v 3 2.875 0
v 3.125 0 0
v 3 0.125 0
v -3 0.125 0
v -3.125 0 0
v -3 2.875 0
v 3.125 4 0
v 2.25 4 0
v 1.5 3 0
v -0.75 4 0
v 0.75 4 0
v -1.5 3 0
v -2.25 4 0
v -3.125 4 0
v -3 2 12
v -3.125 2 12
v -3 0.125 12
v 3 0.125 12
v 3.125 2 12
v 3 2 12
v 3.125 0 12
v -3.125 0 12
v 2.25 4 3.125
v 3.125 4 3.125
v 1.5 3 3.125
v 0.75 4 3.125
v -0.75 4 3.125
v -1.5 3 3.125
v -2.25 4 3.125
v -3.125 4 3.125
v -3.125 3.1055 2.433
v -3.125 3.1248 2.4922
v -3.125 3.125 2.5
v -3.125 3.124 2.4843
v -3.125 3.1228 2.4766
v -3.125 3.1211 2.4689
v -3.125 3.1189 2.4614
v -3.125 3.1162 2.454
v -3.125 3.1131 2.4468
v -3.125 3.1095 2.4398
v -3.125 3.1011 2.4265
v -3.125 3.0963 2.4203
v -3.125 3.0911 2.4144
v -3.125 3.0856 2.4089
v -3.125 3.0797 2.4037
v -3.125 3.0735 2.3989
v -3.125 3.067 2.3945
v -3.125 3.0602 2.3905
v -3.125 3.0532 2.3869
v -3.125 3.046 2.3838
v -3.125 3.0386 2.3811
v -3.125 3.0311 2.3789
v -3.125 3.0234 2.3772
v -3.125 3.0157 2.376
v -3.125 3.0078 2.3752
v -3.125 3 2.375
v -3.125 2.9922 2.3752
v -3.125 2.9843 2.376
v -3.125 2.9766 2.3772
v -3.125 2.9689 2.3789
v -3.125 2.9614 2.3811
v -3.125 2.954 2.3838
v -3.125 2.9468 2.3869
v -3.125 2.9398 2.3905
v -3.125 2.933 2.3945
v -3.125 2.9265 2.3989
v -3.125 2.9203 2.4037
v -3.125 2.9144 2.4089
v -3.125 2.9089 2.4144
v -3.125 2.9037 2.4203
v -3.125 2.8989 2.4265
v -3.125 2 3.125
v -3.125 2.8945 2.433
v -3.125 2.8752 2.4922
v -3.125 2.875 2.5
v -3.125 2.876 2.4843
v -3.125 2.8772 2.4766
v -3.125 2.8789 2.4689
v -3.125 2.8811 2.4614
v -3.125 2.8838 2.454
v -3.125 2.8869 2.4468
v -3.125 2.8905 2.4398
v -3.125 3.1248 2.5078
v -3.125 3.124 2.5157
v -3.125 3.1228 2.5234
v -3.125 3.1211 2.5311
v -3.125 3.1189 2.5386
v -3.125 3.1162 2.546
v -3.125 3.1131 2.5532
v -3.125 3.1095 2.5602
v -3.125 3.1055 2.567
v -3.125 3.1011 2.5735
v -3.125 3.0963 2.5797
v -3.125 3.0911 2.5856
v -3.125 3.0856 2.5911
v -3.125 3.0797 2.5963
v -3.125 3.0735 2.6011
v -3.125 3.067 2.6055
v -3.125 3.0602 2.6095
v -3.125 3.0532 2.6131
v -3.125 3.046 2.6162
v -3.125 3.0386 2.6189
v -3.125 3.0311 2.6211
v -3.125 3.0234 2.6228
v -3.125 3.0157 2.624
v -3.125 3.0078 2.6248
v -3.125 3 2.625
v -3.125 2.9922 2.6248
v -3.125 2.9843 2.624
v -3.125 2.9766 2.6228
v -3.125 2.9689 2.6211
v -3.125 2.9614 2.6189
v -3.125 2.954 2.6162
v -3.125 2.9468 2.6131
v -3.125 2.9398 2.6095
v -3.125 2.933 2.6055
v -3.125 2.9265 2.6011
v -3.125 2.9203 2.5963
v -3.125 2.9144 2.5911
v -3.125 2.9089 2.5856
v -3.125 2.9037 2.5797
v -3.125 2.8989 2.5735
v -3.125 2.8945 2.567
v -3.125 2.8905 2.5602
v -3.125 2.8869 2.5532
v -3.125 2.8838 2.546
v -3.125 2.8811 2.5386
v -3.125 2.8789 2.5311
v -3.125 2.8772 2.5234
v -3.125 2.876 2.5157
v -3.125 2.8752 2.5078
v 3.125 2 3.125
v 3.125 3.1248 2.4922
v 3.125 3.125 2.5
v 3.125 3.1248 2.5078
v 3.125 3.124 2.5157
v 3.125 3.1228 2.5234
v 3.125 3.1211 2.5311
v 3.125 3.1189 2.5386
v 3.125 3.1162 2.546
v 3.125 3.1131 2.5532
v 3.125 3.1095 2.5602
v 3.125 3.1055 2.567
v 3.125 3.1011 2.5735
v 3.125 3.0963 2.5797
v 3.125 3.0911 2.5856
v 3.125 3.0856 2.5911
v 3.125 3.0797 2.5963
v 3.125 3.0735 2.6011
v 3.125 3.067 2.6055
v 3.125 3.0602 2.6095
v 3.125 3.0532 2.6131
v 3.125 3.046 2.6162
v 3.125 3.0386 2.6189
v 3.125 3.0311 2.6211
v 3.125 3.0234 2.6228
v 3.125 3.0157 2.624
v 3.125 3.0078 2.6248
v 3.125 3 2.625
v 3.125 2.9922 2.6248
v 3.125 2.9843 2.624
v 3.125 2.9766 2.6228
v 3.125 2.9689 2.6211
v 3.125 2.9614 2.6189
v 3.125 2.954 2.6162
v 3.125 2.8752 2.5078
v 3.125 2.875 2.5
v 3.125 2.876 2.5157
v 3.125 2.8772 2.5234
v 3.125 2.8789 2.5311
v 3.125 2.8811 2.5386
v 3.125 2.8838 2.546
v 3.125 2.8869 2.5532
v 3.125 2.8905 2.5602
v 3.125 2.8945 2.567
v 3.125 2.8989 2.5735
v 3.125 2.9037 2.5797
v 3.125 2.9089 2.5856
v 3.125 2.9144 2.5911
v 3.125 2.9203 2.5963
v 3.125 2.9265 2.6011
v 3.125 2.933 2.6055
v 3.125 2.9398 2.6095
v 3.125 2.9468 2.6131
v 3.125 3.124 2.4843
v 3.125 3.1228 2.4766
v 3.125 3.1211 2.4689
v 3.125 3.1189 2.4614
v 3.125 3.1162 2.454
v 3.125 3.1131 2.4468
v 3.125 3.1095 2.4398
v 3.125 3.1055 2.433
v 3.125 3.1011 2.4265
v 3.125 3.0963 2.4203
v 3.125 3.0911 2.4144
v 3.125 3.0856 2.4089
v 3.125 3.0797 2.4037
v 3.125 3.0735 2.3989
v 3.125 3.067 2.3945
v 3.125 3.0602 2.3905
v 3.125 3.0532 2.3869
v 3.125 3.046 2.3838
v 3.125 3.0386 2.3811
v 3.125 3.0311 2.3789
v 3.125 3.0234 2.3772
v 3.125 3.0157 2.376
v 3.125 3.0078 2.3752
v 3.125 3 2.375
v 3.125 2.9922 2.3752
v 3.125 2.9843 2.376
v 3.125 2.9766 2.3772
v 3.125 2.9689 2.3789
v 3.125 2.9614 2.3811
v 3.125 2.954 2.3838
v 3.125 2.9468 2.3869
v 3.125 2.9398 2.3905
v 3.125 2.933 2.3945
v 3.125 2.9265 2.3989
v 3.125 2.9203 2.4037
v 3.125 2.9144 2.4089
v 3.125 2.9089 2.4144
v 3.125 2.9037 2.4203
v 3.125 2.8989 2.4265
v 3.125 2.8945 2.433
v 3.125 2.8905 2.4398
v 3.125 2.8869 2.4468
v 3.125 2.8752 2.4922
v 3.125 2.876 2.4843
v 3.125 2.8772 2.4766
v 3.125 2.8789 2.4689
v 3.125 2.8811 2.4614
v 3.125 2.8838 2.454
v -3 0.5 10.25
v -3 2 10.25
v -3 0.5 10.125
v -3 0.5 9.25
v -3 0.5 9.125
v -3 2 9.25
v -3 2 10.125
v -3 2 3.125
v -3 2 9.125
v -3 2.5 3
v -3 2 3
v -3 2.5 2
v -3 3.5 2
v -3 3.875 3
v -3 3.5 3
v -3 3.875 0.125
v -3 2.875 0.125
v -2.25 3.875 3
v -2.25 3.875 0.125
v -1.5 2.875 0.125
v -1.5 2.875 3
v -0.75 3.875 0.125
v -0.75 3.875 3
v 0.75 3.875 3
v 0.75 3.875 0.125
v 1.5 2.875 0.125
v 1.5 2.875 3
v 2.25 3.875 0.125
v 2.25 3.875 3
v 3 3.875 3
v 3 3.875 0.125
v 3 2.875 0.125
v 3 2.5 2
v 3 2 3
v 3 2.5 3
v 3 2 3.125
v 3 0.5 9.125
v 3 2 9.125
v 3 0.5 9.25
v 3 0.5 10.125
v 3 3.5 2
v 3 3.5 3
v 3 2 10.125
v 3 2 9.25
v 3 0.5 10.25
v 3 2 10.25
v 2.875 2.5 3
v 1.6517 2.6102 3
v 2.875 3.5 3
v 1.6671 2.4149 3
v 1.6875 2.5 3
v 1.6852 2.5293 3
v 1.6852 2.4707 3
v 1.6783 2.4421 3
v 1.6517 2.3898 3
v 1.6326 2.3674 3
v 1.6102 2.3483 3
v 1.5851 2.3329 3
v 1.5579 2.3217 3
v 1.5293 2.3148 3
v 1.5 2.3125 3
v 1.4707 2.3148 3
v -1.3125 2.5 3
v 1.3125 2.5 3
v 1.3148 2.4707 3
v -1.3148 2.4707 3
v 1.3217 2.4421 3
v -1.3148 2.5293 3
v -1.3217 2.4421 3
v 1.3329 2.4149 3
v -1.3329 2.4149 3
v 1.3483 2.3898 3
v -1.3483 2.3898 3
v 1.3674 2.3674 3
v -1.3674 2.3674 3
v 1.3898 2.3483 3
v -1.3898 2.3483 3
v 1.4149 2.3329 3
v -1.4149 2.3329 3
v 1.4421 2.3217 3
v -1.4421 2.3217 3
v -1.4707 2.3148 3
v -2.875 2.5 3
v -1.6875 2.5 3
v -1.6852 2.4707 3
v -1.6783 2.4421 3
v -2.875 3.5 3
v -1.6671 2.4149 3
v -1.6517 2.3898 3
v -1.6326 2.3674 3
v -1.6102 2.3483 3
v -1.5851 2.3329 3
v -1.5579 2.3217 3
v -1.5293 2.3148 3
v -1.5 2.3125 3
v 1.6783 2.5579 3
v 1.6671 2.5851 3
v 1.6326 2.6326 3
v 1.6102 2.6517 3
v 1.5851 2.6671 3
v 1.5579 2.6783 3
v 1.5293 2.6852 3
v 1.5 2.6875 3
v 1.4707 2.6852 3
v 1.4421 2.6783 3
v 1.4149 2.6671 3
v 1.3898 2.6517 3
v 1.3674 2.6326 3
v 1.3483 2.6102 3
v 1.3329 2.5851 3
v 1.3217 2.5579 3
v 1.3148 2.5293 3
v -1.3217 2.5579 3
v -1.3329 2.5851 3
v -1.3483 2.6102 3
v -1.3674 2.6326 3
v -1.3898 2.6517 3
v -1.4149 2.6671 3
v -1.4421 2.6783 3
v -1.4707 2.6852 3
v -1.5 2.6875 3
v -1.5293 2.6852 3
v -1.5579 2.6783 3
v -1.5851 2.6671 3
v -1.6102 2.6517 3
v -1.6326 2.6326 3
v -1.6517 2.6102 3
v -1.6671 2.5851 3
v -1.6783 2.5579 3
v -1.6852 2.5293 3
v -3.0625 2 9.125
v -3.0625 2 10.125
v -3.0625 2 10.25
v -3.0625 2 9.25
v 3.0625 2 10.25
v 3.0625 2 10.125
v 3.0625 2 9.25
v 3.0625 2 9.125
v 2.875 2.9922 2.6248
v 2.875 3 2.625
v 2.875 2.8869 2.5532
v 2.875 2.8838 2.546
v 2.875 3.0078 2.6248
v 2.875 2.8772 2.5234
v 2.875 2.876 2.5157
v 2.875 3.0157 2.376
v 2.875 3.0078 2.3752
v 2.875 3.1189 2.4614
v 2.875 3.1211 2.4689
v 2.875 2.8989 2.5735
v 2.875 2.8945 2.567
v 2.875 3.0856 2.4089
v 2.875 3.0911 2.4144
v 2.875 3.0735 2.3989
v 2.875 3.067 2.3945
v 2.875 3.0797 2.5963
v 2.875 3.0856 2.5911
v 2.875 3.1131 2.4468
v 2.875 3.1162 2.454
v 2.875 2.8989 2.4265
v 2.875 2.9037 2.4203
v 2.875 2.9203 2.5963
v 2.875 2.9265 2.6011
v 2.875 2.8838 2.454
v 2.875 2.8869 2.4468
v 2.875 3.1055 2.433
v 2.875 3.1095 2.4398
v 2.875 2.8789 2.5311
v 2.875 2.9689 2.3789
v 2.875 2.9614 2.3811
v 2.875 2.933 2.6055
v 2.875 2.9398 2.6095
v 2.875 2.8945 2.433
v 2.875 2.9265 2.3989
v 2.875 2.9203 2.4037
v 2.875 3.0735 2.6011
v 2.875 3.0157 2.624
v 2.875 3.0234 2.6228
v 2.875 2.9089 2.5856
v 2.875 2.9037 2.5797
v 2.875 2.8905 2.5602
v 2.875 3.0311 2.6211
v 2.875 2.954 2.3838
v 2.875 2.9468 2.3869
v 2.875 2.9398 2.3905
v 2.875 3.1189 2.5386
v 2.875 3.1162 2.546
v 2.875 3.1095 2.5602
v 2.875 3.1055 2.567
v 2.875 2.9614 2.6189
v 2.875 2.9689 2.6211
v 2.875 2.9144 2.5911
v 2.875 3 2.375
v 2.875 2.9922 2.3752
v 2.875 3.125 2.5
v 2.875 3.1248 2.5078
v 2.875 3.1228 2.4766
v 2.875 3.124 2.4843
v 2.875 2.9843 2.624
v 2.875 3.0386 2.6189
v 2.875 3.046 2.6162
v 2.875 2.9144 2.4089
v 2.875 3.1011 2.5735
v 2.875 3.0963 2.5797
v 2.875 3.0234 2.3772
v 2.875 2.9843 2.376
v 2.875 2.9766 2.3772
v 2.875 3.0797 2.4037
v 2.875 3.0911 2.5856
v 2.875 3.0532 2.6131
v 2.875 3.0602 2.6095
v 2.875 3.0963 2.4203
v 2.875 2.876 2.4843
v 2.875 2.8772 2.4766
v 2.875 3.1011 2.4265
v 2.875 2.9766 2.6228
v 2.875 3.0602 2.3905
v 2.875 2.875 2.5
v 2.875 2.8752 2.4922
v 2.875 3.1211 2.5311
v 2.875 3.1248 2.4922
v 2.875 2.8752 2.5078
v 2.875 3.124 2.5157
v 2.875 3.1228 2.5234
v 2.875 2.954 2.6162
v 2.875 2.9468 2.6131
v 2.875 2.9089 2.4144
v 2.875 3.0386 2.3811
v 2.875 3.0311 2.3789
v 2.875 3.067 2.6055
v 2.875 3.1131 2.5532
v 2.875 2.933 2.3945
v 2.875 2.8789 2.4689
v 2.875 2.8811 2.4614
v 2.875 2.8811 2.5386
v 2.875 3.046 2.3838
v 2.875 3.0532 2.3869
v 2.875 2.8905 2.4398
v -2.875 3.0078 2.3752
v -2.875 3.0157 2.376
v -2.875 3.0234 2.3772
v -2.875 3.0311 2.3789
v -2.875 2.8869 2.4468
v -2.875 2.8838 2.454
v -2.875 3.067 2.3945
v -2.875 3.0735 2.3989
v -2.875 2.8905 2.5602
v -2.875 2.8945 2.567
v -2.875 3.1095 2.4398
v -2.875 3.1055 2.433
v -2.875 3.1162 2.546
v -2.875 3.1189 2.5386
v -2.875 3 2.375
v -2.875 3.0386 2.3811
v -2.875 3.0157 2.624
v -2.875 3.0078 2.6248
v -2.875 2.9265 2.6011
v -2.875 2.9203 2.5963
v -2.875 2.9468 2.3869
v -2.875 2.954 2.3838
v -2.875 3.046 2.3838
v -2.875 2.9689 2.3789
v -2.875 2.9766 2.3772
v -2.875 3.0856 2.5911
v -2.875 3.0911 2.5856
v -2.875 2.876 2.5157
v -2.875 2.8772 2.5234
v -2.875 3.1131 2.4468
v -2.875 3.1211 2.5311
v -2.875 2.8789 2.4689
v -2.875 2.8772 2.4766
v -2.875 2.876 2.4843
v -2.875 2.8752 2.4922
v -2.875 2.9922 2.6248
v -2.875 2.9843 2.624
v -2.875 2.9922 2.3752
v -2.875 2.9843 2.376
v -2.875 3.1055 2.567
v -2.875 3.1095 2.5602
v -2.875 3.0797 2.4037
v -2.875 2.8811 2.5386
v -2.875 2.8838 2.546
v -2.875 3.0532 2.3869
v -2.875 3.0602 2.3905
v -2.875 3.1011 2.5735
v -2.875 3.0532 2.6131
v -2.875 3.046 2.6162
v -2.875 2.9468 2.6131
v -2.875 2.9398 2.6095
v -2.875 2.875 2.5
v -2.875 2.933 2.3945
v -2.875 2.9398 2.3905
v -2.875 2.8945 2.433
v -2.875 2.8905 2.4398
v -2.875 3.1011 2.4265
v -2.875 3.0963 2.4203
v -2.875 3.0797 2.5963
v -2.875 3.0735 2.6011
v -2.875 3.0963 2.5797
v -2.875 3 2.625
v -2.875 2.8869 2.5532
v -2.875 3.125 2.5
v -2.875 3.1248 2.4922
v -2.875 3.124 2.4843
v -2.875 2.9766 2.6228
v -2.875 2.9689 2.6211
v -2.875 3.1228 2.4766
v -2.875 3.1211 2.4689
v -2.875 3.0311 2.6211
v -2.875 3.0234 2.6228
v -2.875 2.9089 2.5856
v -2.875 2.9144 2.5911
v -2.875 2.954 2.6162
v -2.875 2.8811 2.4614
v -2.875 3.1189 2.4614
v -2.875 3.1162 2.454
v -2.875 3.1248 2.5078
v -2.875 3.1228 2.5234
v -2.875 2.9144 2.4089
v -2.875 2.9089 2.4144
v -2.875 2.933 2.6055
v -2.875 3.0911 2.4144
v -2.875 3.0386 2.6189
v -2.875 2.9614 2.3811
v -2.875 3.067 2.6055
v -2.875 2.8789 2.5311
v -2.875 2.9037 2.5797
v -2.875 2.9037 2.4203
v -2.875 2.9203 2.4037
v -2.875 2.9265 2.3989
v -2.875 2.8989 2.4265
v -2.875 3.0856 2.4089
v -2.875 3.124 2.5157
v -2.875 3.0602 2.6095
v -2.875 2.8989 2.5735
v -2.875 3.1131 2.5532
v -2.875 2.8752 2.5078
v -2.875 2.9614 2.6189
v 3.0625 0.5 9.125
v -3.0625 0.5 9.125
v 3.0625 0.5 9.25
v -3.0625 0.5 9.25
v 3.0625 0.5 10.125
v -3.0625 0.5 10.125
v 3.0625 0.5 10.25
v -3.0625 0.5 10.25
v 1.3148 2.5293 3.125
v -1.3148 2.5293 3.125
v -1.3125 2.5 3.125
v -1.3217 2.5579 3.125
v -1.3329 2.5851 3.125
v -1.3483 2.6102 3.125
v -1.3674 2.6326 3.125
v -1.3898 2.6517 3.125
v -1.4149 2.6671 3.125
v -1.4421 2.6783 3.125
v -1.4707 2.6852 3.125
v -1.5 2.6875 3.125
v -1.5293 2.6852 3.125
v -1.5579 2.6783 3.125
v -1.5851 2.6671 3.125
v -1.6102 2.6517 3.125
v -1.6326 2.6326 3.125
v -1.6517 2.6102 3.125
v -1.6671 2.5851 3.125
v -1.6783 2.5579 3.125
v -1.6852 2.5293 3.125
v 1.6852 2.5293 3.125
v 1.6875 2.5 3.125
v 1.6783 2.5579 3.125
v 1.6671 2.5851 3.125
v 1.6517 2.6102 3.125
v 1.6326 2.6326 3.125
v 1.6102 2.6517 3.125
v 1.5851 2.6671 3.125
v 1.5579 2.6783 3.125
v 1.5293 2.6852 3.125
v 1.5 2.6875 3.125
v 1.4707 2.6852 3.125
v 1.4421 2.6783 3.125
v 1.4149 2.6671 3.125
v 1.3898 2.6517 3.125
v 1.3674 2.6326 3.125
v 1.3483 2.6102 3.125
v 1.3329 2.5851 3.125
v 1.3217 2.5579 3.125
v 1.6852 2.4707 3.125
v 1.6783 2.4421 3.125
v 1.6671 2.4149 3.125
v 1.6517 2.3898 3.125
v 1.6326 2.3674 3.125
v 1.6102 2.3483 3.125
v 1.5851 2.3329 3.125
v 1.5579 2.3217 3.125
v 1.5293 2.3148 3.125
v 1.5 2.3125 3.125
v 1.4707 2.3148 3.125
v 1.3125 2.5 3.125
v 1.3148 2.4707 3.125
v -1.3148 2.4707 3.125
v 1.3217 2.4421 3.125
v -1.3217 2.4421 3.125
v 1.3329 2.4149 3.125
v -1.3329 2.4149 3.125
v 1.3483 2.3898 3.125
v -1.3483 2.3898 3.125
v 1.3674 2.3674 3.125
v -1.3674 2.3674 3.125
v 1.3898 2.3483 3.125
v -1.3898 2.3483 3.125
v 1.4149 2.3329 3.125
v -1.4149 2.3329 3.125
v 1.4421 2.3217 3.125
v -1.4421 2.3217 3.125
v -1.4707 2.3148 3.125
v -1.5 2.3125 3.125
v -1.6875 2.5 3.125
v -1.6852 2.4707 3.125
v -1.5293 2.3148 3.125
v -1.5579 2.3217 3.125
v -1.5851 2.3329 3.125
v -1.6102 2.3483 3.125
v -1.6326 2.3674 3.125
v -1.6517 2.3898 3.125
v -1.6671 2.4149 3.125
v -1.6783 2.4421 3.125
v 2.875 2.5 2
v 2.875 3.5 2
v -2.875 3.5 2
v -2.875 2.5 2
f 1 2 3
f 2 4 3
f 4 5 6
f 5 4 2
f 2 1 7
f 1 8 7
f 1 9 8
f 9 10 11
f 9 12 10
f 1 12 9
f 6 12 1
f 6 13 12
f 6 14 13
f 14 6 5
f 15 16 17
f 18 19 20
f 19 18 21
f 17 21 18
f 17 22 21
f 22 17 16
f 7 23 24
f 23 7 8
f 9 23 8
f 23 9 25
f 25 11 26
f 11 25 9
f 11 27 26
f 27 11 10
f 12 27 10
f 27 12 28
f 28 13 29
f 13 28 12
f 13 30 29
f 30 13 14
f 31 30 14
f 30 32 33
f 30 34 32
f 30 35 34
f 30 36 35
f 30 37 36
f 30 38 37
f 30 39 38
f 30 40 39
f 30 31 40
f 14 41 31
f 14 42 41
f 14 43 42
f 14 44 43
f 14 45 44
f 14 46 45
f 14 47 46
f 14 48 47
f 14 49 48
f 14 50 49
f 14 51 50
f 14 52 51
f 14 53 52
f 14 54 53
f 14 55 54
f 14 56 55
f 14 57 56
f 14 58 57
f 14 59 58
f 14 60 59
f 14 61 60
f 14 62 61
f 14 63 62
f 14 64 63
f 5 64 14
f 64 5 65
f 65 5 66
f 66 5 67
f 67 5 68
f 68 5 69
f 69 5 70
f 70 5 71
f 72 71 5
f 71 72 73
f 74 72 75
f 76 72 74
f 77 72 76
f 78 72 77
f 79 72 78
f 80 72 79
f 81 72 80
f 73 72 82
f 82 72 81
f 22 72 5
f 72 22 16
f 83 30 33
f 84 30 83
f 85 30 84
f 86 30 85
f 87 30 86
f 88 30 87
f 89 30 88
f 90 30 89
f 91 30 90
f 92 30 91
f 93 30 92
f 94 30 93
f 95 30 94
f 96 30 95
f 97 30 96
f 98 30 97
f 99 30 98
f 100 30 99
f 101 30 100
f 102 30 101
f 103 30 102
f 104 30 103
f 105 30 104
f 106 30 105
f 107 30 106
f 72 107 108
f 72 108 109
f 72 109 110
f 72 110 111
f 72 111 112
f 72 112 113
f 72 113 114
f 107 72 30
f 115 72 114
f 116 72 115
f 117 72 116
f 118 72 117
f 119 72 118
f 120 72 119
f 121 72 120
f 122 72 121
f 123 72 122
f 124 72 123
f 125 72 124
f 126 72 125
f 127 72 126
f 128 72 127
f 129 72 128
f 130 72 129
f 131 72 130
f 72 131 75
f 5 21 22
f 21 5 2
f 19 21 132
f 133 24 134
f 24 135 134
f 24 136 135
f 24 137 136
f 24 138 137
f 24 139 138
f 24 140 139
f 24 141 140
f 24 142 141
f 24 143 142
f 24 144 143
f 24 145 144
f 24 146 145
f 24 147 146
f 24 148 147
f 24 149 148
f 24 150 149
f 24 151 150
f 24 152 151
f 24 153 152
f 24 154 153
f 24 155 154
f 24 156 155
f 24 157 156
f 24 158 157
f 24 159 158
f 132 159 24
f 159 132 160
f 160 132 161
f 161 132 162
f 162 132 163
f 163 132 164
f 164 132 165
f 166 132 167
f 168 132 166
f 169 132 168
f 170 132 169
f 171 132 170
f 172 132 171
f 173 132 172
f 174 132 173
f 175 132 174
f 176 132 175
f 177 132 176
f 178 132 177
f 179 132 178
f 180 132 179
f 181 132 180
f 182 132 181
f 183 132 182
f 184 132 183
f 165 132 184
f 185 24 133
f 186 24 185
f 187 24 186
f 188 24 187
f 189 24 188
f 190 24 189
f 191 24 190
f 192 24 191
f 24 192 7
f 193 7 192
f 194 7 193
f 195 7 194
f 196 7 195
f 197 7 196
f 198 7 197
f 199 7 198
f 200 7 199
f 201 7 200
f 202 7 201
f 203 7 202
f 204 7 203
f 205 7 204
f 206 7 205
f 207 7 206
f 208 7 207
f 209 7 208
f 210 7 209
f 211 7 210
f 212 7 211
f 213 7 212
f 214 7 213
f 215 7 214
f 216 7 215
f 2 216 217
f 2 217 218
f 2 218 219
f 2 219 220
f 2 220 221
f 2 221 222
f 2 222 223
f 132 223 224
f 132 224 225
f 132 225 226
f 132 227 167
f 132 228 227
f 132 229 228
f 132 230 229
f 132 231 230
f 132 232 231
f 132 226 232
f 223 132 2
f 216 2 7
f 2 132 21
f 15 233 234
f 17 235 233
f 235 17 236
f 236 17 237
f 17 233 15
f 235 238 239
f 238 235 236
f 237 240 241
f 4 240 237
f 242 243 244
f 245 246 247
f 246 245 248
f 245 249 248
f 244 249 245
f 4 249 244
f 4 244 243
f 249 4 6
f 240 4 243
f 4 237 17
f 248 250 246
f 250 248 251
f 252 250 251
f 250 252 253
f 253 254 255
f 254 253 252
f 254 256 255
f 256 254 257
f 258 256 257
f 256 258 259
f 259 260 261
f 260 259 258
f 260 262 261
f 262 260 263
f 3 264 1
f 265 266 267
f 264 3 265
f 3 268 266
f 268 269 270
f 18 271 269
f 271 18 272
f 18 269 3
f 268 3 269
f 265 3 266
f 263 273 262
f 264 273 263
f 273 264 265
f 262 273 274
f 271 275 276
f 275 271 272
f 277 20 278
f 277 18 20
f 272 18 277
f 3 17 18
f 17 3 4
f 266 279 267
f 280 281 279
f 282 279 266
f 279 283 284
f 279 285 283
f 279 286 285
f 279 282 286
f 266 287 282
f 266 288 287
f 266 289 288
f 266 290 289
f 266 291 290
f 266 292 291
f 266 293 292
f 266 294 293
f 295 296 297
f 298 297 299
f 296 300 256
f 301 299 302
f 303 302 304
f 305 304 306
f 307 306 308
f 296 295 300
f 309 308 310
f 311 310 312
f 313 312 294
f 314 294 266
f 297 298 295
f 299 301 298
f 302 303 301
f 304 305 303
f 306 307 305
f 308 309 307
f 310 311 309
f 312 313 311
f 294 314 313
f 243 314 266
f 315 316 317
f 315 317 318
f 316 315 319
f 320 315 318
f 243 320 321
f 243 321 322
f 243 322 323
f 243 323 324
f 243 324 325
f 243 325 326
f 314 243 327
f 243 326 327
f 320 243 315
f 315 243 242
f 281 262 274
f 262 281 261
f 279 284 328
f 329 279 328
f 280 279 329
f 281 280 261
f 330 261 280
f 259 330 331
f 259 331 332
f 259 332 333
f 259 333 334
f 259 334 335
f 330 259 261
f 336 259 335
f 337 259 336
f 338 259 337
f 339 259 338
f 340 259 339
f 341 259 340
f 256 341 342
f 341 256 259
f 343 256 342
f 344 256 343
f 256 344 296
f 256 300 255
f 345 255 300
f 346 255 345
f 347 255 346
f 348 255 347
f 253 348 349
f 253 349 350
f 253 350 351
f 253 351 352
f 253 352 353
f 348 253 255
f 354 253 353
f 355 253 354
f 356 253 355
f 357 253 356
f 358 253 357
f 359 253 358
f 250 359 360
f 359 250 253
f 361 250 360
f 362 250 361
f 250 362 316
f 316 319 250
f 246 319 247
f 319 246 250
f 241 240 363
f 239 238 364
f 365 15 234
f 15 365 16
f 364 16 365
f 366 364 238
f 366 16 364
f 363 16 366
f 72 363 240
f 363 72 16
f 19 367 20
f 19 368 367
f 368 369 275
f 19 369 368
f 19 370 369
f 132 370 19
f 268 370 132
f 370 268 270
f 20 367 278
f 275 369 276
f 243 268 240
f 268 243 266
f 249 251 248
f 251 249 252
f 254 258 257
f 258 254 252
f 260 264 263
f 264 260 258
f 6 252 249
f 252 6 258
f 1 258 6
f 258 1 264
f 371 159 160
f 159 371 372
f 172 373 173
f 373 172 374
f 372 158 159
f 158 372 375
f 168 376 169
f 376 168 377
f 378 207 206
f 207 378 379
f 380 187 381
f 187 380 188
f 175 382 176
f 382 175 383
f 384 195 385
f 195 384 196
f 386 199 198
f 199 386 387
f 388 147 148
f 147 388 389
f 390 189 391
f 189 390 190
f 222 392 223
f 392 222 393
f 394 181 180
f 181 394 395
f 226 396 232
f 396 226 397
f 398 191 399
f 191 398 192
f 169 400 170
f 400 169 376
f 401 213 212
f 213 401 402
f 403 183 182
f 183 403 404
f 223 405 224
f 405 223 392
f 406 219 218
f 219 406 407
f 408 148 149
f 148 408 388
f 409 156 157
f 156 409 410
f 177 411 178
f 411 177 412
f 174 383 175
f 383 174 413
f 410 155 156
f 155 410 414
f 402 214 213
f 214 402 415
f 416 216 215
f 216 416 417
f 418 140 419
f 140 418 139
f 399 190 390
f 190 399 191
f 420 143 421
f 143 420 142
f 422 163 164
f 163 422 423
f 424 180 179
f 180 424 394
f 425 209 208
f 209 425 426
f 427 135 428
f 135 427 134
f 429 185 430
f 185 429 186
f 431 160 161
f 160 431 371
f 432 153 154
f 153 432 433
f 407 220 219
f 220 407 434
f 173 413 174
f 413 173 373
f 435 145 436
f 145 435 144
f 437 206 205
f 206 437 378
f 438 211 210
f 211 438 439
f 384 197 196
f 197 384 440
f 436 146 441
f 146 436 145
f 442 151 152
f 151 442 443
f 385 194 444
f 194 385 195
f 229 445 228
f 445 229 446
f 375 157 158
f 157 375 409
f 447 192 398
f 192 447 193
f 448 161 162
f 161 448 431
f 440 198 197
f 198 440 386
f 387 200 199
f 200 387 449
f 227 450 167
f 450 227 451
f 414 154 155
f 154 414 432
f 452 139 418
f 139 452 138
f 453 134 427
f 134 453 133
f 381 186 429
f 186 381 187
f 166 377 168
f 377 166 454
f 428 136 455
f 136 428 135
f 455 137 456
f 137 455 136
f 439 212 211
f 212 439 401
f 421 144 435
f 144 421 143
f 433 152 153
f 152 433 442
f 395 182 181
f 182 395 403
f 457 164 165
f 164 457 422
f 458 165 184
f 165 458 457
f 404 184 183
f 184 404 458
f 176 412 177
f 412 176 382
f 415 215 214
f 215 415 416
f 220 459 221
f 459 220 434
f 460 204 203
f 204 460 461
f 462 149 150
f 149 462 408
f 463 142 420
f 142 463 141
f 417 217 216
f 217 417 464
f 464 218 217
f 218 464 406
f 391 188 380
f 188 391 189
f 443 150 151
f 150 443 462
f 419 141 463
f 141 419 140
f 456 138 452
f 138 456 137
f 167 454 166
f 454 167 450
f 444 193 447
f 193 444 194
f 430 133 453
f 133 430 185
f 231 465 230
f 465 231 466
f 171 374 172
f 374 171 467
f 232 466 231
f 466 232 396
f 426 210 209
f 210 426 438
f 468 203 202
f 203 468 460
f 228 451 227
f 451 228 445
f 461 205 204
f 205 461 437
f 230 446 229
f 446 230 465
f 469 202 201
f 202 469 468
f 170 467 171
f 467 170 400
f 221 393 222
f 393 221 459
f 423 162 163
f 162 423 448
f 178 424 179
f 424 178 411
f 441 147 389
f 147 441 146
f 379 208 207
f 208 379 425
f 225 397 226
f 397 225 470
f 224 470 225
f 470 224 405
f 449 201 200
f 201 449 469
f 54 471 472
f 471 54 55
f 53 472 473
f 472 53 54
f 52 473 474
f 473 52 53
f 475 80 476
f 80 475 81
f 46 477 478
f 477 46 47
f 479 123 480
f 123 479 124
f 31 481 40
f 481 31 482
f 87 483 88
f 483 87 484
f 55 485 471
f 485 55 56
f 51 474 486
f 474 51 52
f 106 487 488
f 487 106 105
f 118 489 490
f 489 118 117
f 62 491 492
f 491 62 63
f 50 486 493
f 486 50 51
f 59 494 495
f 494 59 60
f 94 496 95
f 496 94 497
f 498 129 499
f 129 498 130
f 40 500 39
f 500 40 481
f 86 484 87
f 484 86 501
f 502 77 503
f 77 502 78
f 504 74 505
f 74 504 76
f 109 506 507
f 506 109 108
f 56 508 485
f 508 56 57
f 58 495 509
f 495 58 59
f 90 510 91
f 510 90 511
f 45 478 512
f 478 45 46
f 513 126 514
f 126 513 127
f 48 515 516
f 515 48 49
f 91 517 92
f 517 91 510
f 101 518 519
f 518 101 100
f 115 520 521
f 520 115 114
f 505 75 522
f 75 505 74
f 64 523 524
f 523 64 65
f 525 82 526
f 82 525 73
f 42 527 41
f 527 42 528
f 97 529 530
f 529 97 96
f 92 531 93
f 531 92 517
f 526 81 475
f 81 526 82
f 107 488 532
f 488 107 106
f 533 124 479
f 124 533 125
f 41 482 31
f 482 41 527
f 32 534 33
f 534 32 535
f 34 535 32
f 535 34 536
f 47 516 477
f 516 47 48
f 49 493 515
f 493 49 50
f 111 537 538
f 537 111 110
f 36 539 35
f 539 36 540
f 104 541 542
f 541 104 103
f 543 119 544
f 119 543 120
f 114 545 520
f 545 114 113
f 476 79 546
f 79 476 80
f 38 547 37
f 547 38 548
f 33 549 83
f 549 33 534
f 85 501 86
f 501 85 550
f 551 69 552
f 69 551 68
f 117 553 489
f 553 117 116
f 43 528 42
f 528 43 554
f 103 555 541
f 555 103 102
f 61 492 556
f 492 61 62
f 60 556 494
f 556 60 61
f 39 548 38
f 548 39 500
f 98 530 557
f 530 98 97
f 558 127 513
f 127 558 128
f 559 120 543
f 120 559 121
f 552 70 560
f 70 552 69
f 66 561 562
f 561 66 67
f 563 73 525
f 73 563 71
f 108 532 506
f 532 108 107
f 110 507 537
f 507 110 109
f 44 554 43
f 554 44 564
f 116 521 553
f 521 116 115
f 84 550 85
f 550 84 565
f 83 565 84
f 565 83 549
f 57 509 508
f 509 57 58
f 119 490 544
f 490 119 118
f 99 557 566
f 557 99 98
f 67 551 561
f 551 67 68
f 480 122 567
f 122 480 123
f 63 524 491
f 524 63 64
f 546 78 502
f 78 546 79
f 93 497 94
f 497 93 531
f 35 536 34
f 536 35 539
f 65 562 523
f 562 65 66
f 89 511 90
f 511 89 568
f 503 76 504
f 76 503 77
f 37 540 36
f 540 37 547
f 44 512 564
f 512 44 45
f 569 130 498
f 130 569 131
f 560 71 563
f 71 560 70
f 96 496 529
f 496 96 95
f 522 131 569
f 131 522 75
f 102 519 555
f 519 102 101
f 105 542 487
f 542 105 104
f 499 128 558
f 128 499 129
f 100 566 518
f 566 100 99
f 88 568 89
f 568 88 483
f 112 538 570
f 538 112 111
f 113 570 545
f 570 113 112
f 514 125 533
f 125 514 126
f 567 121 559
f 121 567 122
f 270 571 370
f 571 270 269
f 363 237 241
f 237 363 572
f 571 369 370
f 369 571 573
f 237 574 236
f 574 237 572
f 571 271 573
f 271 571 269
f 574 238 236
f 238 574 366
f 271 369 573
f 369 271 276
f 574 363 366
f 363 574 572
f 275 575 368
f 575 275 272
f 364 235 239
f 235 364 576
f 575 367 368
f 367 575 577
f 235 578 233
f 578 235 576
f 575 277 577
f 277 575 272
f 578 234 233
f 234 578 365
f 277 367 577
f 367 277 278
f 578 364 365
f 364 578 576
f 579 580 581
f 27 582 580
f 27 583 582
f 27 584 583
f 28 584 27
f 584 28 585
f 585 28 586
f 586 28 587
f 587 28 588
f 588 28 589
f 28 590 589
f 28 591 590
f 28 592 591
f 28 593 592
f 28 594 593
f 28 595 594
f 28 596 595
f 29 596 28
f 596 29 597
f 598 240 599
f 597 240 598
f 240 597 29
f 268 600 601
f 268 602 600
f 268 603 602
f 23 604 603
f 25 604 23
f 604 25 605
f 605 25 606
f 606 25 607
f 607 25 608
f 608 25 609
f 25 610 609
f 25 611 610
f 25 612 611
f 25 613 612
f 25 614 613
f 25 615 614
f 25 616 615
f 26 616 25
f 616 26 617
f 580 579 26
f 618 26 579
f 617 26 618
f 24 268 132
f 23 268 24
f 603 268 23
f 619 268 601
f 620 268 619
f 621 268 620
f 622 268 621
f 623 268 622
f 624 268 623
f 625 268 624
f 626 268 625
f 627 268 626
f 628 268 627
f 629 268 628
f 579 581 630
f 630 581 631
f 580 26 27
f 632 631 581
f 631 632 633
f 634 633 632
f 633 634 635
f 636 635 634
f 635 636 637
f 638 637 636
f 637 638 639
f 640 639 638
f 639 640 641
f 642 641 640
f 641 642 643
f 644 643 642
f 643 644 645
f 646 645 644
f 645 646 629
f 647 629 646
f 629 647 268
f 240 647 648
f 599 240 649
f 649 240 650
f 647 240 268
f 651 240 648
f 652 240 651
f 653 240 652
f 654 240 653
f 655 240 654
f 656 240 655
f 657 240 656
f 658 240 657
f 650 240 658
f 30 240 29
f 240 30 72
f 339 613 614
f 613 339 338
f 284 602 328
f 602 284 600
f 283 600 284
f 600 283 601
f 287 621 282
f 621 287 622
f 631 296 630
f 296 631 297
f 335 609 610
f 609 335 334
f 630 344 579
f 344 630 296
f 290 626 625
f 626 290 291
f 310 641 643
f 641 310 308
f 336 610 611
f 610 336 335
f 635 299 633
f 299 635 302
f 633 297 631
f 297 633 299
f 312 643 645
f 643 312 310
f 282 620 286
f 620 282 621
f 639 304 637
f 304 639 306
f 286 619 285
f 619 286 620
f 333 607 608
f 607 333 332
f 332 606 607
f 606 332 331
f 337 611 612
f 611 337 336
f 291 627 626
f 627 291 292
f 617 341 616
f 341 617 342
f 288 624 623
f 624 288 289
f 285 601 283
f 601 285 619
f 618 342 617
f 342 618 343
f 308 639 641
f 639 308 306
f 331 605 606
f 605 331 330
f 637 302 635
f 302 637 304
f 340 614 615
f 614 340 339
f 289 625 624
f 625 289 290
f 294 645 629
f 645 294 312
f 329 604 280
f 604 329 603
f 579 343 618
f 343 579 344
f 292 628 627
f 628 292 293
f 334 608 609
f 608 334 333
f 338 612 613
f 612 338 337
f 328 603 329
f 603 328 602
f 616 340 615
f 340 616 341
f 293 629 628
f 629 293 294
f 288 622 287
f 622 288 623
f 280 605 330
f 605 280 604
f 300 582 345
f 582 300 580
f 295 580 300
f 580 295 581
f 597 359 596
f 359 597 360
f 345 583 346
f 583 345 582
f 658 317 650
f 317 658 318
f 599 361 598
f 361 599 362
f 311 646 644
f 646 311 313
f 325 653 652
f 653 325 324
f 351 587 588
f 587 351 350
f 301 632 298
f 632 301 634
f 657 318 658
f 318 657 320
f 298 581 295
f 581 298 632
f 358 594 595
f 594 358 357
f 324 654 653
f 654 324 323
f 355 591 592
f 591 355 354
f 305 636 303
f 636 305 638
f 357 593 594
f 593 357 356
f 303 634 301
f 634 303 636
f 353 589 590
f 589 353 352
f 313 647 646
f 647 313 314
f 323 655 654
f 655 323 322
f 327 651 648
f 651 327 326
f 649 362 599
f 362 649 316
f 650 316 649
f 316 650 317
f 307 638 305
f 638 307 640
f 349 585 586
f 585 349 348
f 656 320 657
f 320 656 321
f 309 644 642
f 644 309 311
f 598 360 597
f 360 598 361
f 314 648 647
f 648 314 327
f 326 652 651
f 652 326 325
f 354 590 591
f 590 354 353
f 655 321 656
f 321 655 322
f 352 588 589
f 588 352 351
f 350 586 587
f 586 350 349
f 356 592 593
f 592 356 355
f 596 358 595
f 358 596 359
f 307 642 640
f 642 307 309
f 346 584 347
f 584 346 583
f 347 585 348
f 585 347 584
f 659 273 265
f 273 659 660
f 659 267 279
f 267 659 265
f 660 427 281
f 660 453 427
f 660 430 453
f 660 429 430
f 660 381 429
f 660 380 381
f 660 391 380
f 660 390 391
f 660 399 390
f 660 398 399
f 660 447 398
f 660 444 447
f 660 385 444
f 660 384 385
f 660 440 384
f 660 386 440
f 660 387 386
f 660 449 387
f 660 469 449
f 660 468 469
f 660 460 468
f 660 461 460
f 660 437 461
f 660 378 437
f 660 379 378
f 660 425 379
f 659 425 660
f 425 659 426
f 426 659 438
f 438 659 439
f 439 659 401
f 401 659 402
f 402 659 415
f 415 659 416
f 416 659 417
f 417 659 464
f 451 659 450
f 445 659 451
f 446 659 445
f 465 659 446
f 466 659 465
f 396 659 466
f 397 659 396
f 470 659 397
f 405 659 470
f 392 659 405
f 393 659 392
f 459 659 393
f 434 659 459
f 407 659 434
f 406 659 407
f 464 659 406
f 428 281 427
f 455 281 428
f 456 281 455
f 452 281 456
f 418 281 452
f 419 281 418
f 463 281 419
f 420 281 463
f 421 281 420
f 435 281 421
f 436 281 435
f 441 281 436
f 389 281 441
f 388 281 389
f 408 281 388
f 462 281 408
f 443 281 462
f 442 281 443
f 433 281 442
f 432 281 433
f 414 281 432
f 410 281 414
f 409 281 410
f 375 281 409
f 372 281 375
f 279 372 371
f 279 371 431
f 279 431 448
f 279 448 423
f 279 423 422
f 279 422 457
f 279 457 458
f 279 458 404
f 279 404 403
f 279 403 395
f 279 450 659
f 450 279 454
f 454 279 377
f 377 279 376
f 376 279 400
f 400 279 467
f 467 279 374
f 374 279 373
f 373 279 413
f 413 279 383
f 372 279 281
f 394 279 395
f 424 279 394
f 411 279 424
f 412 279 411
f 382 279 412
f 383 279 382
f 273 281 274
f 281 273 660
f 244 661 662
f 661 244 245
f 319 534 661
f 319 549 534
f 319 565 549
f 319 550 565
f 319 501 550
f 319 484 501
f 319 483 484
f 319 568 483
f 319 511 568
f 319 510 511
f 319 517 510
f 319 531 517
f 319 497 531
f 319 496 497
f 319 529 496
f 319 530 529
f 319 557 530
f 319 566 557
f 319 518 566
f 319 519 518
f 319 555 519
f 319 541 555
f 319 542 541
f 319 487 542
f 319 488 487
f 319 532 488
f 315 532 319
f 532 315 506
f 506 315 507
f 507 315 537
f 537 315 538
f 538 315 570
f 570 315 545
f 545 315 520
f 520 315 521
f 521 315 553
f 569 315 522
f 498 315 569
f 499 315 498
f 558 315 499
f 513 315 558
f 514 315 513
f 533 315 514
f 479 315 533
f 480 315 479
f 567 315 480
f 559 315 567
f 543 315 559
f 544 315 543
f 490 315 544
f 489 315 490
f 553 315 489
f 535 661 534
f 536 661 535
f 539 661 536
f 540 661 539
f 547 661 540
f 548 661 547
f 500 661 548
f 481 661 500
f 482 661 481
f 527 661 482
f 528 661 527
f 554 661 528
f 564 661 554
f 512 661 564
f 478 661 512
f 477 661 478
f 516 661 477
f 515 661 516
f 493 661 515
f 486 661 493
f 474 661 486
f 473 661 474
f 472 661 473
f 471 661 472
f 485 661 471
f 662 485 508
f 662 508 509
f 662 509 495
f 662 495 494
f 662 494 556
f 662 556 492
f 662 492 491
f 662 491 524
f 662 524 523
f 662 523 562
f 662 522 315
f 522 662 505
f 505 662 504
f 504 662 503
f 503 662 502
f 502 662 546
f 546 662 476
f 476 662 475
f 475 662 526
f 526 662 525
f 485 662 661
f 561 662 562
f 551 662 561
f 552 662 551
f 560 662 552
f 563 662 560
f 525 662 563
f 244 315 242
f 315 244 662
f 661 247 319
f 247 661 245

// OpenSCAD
    $fn=40;
//definiere Punkte für Polygon d. Querschnittes. X...äußerer Punkt. 
//X1...Punkt X um Wandstärke (=0.125) hineinversetzt
A=[-3.125, 0];              A1=[-3,0.125];
B=[3.125, 0];               B1=[3,0.125];
C=[3.125, 4];               C1=[3, 3.875];
D=[2.25, 4];                D1=[2.25, 3.875];
E=[1.5, 3];                 E1=[1.5, 2.875]; 
F=[0.75, 4];                F1=[0.75, 3.875]; 
G=[-0.75, 4];               G1=[-0.75, 3.875];
H=[-1.5, 3];                H1=[-1.5, 2.875];
I=[-2.25, 4];               I1=[-2.25, 3.875];
J=[-3.125, 4];              J1=[-3, 3.875];
K=[-3.125, 2.875];
L=[3.125, 2.875];

//Koordinaten für Befestigungsquader am grünen Teil (innen 1 inch x 1 inch)
Q=[3,2.5];
R=[2.875,2.5];
S=[2.875,3.5];
T=[3,3.5];
Q2=[-3,2.5];
R2=[-2.875,2.5];
S2=[-2.875,3.5];
T2=[-3,3.5];

//Koordinaten für große Platte mit Schiene
a=[3.0625,3.75];
b=[-3.0625,3.75];
c=[-3.0625,0.5];
d=[3.0625,0.5];


A4=[-3.125, 2]; //grüner linker hintere Ecke clemens
B4=[3.125, 2];  //grüne linke vordere Ecke

// äußere difference funktion für bohrung an den Seiten durch Hauptteil
difference () {
    
union(){
    
difference() {
linear_extrude(height = 12, convexity = 10, twist = 0)                      
    //height=12 in = 1 ft
polygon(points=[A,B,C,D,E,F,G,H,I,J, A1, B1, C1, D1, E1, F1, G1, H1, I1, J1], paths=[[0,1,2,3,4,5,6,7,8,9],[10,11,12,13,14,15,16,17,18,19]]);
translate([-5,2,3])
cube(10);
}
linear_extrude(height = 0.125, convexity = 10, twist = 0)
polygon(points=[K,L,C,D,E,F,G,H,I,J], paths=[[0,1,2,3,4,5,6,7,8,9]]);


}
zylinder1();
zylinder2();
bigSchiene();
smallSchiene();
}


/* es fehlt noch an obigem Teil:    
        *Bohrungen
        *"Schienen" 
        *Löcher für Rastnasen oder ähnliches zum Zusammenstecken
*/

{

//translate([0, 0, 0])

A4=[-3.125, 2];
B4=[3.125, 2];                           
C4=[3.125, 4];
D4=[-3.125, 4]; 

  


//linear_extrude(height = 0.125, convexity = 10, twist = 0)
//polygon(points=[A4, B4, C4,D4]);



}



union(){

translate([0, 0, 3])


//grüner Teil Anfang


 
difference(){


linear_extrude(height = 0.125, convexity = 10, twist = 0)

//polygon(points=[A, B, C,D, E, F, G]), paths=[[0,1,2,3,4,5,6]]);





polygon(points=[A4, B4, C, D, E, F, G, H, I, J]);
  
   
translate([1.5, 2.5, 0])
bohrung(inner_circle_r);

translate([-1.5, 2.5, 0])
bohrung(inner_circle_r); 
    
}


//grüner Teil Ende

//Befestigung grünes Teil (Mutter-Schraube)




//Quader1

//difference=Bohrung
difference(){

translate([0,0,2])

linear_extrude(height = 1, convexity = 10, twist = 0)
polygon(points=[Q,R,S,T]);
    zylinder1();
}

//Quader2

difference(){
translate([0,0,2])

linear_extrude(height = 1, convexity = 10, twist = 0)
polygon(points=[Q2,R2,S2,T2]);
zylinder2();
    }
}




//die beiden Zylinder für die Bohrungen
module zylinder1()
    {
translate([5,3,2.5])
rotate([0,-90,0])
cylinder(r=0.125,h=2.5,$fn=100);
    }
    
    module zylinder2()
    {
translate([-5,3,2.5])
rotate([0,90,0])
cylinder(r=0.125,h=2.5,$fn=100);
    }
    
    
//zylinder2();
//zylinder1();
    
inner_circle_r = 0.1875; //3/16 inch
module bohrung(x) 
{
linear_extrude(height = 0.4, center = true, convexity = 10, twist = 0)
circle(inner_circle_r);
}

module bigSchiene()
{
    translate([0,0,9.125])
    linear_extrude(height=0.125, convexity=10, twist=0)
    polygon(points=[a,b,c,d]);
    }
    
module smallSchiene()
{
    translate([0,0,10.125])
    linear_extrude(height=0.125, convexity=10, twist=0)
    polygon(points=[a,b,c,d]);
    }
//bigPlate();
